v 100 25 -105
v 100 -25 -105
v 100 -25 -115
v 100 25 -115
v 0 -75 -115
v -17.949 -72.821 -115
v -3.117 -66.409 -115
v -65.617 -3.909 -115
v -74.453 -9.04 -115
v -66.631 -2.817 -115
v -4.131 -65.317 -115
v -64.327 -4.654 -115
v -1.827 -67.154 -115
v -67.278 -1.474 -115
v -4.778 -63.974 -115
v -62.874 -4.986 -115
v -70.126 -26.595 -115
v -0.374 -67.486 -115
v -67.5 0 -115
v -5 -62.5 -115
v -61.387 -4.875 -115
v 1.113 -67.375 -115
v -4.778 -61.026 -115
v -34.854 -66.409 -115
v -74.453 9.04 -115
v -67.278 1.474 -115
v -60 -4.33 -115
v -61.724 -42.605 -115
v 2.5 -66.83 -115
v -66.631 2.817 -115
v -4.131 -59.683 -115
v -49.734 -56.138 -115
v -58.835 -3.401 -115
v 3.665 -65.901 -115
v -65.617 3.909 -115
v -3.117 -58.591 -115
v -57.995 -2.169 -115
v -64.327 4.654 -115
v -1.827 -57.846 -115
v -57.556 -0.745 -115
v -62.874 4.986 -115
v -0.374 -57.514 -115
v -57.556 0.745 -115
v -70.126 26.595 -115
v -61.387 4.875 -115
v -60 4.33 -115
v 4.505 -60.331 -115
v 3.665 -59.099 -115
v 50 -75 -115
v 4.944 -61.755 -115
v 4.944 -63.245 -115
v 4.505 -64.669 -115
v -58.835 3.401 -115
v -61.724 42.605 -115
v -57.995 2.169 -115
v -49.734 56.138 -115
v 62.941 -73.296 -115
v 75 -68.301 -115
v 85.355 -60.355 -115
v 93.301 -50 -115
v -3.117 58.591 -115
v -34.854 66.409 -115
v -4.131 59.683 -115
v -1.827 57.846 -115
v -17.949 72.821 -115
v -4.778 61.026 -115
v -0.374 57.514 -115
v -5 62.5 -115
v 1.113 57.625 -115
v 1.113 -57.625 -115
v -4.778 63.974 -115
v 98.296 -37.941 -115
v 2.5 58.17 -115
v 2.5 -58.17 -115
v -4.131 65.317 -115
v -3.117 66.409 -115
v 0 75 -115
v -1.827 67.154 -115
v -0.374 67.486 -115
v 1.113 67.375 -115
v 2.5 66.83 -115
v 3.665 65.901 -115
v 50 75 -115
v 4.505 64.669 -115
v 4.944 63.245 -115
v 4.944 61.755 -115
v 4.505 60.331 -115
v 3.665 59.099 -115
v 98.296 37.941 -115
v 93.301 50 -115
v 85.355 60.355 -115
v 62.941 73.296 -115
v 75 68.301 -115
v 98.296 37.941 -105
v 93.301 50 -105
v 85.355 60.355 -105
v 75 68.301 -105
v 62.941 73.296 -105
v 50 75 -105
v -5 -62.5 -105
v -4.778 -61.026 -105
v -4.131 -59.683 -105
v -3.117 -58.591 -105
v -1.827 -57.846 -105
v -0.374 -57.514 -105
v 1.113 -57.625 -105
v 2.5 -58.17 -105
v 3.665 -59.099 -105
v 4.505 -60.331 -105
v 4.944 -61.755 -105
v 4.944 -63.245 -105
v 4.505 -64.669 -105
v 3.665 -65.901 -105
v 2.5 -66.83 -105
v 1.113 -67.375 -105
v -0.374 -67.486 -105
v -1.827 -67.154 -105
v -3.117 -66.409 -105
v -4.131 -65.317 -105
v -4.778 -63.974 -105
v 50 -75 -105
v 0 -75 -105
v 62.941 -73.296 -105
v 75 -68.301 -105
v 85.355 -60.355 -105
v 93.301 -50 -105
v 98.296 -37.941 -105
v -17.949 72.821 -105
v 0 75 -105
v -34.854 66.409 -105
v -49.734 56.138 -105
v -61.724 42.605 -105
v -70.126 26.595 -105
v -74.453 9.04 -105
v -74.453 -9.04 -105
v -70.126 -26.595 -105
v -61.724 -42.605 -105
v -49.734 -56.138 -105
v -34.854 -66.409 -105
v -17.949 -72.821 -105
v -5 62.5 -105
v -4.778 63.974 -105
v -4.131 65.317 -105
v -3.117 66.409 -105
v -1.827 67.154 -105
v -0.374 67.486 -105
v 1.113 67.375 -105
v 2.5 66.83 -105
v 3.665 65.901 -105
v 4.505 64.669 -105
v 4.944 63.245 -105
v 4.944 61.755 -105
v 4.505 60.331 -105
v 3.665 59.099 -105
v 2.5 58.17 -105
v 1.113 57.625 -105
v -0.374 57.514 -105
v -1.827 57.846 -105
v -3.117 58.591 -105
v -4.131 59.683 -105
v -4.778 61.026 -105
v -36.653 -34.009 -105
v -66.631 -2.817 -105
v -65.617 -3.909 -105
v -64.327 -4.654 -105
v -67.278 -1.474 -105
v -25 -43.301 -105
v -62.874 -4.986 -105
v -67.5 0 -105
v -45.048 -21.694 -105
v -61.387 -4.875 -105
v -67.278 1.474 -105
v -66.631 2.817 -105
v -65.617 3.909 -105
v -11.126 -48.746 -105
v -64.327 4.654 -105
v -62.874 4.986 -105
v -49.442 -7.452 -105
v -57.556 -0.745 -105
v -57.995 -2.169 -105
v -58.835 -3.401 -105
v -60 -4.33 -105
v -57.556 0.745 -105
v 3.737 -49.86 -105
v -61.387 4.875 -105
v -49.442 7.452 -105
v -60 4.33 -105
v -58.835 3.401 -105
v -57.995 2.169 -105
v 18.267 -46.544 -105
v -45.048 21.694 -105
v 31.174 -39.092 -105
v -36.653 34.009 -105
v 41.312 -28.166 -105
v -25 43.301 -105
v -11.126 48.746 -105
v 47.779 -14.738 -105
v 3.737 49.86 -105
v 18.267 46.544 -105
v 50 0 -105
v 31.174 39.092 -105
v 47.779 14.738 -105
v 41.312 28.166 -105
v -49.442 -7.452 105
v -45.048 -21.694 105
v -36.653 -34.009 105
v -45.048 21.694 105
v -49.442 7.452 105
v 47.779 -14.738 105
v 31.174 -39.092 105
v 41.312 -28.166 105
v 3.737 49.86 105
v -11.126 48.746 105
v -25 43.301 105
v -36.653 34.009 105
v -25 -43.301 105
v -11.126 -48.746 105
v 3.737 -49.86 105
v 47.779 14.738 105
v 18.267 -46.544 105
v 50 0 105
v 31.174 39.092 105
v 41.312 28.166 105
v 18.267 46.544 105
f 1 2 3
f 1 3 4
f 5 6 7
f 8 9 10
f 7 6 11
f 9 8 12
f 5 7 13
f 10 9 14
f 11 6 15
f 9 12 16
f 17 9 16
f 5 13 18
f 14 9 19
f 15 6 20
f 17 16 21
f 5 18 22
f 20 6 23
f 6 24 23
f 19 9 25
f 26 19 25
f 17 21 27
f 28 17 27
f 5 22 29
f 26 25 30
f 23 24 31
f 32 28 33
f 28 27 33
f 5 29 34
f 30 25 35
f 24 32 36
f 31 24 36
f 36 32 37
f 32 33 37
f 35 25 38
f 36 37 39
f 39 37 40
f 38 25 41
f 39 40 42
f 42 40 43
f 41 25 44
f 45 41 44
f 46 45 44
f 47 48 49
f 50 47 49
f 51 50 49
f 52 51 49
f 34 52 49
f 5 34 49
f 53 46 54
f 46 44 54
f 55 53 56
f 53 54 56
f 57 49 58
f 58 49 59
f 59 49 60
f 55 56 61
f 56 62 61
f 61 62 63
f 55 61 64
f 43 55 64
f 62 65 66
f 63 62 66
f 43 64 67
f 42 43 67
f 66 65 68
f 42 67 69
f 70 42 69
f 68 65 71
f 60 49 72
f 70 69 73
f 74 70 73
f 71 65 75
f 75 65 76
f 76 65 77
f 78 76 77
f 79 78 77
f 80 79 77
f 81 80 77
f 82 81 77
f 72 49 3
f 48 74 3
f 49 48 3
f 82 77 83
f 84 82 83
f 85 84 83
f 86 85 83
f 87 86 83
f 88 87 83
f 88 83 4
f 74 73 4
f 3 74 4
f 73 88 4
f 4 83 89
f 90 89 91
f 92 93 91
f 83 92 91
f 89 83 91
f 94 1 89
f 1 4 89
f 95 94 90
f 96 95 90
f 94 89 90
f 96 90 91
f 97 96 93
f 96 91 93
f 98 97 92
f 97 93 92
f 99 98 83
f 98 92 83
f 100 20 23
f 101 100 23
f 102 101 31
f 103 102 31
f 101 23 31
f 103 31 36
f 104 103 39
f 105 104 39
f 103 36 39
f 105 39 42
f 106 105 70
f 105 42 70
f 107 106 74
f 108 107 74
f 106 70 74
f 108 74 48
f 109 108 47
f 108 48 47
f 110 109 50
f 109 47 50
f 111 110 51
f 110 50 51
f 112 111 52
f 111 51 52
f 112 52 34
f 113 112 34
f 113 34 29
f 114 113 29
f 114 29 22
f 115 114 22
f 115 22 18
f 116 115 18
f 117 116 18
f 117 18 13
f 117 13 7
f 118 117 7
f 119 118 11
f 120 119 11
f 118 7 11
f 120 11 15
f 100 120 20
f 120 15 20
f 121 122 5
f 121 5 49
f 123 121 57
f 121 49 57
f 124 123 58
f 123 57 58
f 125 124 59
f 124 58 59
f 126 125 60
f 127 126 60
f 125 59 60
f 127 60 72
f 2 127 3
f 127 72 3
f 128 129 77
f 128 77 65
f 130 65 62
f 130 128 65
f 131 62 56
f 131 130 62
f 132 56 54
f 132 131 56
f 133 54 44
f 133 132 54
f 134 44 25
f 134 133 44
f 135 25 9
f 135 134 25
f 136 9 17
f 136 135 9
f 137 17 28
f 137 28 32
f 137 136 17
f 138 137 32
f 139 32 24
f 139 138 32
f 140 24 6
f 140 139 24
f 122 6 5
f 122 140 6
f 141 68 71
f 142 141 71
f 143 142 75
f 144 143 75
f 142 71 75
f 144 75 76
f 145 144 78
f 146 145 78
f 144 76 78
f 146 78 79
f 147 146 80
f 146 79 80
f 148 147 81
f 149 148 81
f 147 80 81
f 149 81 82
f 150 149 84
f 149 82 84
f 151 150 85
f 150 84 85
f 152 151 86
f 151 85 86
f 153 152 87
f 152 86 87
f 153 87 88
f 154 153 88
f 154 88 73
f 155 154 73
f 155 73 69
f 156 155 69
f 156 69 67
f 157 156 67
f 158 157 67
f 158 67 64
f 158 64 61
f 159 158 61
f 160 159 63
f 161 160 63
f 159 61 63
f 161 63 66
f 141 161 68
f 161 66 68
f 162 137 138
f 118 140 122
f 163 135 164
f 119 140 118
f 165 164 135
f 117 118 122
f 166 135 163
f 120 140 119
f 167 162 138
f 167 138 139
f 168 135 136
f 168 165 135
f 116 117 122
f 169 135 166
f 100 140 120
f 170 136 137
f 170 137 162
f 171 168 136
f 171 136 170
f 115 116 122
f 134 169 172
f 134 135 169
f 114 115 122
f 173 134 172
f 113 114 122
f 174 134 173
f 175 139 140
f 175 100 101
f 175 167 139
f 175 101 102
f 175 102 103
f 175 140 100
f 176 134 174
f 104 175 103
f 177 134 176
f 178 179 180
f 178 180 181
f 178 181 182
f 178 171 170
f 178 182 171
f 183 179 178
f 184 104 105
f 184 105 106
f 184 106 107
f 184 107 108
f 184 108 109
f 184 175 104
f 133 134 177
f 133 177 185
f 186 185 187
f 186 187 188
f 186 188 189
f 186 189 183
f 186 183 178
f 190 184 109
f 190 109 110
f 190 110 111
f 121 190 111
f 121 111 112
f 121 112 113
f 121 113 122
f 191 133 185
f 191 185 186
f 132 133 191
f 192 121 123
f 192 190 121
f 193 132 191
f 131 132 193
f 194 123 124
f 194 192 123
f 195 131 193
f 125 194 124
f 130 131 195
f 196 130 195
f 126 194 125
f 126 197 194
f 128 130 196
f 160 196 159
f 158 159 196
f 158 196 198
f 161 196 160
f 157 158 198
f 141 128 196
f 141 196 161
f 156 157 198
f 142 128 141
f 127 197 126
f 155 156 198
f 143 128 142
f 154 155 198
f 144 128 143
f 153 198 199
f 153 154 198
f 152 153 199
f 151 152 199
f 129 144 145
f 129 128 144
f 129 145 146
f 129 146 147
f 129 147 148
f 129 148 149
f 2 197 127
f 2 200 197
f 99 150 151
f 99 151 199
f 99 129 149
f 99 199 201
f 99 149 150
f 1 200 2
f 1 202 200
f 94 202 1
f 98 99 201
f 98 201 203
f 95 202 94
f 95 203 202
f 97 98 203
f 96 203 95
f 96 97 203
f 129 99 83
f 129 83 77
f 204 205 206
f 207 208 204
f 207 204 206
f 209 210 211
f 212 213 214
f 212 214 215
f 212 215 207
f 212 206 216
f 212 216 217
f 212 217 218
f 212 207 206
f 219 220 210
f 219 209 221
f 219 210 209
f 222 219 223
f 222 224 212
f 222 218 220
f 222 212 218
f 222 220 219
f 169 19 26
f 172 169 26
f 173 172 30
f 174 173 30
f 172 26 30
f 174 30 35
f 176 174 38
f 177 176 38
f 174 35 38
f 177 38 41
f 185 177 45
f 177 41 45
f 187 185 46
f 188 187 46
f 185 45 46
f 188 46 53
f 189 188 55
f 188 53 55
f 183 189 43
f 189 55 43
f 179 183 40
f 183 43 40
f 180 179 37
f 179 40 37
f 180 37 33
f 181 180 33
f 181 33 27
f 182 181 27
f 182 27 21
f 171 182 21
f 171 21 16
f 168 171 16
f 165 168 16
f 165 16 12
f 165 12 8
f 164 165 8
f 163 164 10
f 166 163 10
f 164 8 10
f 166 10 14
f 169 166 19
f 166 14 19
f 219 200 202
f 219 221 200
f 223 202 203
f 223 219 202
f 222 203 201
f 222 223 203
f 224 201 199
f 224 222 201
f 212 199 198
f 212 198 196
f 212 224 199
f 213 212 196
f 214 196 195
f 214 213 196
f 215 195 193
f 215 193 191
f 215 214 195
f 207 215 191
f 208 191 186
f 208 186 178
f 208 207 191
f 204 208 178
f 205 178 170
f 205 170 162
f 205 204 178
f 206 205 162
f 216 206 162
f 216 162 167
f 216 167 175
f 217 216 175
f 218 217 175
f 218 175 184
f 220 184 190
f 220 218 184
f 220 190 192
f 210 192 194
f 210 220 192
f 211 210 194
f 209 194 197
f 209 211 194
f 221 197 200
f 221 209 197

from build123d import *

# Parameters (mm, degrees)
SKETCH1_R           = 50
BOSS_EXTRUDE1_DEPTH = 105
BOSS_EXTRUDE2_DEPTH = 10
SKETCH3_R           = 5
CUT_EXTRUDE1_DEPTH  = 10
FILLET1_R           = 50


with BuildPart() as part:
    # Sketch1 → Boss-Extrude1 (new, symmetric)
    with BuildSketch(Plane.XY):
        Circle(SKETCH1_R)
    extrude(amount=BOSS_EXTRUDE1_DEPTH, both=True)

    # Sketch2 → Boss-Extrude2 (add)
    with BuildSketch(Plane(origin=(0, 0, -105), x_dir=(-1, 0, 0), z_dir=(0, 0, -1))):
        with BuildLine():
            Line((0, -75), (-100, -75))
            Line((-100, -75), (-100, 75))
            Line((-100, 75), (0, 75))
            ThreePointArc((0, 75), (75, 0), (0, -75))
        make_face()
    extrude(amount=BOSS_EXTRUDE2_DEPTH)

    # Sketch3 → Cut-Extrude1 (cut)
    with BuildSketch(Plane(origin=(0, 0, -115), x_dir=(-1, 0, 0), z_dir=(0, 0, -1))):
        with Locations((0, 62.5)):
            Circle(SKETCH3_R)
        with Locations((0, -62.5)):
            Circle(SKETCH3_R)
        with Locations((62.5, 0)):
            Circle(SKETCH3_R)
    extrude(amount=-CUT_EXTRUDE1_DEPTH, mode=Mode.SUBTRACT)

    # Fillet1
    fillet1_edges = [part.edges().sort_by_distance(p)[0] for p in [
        (100, 75, -110),
        (100, -75, -110),
    ]]
    fillet(fillet1_edges, radius=FILLET1_R)


solid = part.part
